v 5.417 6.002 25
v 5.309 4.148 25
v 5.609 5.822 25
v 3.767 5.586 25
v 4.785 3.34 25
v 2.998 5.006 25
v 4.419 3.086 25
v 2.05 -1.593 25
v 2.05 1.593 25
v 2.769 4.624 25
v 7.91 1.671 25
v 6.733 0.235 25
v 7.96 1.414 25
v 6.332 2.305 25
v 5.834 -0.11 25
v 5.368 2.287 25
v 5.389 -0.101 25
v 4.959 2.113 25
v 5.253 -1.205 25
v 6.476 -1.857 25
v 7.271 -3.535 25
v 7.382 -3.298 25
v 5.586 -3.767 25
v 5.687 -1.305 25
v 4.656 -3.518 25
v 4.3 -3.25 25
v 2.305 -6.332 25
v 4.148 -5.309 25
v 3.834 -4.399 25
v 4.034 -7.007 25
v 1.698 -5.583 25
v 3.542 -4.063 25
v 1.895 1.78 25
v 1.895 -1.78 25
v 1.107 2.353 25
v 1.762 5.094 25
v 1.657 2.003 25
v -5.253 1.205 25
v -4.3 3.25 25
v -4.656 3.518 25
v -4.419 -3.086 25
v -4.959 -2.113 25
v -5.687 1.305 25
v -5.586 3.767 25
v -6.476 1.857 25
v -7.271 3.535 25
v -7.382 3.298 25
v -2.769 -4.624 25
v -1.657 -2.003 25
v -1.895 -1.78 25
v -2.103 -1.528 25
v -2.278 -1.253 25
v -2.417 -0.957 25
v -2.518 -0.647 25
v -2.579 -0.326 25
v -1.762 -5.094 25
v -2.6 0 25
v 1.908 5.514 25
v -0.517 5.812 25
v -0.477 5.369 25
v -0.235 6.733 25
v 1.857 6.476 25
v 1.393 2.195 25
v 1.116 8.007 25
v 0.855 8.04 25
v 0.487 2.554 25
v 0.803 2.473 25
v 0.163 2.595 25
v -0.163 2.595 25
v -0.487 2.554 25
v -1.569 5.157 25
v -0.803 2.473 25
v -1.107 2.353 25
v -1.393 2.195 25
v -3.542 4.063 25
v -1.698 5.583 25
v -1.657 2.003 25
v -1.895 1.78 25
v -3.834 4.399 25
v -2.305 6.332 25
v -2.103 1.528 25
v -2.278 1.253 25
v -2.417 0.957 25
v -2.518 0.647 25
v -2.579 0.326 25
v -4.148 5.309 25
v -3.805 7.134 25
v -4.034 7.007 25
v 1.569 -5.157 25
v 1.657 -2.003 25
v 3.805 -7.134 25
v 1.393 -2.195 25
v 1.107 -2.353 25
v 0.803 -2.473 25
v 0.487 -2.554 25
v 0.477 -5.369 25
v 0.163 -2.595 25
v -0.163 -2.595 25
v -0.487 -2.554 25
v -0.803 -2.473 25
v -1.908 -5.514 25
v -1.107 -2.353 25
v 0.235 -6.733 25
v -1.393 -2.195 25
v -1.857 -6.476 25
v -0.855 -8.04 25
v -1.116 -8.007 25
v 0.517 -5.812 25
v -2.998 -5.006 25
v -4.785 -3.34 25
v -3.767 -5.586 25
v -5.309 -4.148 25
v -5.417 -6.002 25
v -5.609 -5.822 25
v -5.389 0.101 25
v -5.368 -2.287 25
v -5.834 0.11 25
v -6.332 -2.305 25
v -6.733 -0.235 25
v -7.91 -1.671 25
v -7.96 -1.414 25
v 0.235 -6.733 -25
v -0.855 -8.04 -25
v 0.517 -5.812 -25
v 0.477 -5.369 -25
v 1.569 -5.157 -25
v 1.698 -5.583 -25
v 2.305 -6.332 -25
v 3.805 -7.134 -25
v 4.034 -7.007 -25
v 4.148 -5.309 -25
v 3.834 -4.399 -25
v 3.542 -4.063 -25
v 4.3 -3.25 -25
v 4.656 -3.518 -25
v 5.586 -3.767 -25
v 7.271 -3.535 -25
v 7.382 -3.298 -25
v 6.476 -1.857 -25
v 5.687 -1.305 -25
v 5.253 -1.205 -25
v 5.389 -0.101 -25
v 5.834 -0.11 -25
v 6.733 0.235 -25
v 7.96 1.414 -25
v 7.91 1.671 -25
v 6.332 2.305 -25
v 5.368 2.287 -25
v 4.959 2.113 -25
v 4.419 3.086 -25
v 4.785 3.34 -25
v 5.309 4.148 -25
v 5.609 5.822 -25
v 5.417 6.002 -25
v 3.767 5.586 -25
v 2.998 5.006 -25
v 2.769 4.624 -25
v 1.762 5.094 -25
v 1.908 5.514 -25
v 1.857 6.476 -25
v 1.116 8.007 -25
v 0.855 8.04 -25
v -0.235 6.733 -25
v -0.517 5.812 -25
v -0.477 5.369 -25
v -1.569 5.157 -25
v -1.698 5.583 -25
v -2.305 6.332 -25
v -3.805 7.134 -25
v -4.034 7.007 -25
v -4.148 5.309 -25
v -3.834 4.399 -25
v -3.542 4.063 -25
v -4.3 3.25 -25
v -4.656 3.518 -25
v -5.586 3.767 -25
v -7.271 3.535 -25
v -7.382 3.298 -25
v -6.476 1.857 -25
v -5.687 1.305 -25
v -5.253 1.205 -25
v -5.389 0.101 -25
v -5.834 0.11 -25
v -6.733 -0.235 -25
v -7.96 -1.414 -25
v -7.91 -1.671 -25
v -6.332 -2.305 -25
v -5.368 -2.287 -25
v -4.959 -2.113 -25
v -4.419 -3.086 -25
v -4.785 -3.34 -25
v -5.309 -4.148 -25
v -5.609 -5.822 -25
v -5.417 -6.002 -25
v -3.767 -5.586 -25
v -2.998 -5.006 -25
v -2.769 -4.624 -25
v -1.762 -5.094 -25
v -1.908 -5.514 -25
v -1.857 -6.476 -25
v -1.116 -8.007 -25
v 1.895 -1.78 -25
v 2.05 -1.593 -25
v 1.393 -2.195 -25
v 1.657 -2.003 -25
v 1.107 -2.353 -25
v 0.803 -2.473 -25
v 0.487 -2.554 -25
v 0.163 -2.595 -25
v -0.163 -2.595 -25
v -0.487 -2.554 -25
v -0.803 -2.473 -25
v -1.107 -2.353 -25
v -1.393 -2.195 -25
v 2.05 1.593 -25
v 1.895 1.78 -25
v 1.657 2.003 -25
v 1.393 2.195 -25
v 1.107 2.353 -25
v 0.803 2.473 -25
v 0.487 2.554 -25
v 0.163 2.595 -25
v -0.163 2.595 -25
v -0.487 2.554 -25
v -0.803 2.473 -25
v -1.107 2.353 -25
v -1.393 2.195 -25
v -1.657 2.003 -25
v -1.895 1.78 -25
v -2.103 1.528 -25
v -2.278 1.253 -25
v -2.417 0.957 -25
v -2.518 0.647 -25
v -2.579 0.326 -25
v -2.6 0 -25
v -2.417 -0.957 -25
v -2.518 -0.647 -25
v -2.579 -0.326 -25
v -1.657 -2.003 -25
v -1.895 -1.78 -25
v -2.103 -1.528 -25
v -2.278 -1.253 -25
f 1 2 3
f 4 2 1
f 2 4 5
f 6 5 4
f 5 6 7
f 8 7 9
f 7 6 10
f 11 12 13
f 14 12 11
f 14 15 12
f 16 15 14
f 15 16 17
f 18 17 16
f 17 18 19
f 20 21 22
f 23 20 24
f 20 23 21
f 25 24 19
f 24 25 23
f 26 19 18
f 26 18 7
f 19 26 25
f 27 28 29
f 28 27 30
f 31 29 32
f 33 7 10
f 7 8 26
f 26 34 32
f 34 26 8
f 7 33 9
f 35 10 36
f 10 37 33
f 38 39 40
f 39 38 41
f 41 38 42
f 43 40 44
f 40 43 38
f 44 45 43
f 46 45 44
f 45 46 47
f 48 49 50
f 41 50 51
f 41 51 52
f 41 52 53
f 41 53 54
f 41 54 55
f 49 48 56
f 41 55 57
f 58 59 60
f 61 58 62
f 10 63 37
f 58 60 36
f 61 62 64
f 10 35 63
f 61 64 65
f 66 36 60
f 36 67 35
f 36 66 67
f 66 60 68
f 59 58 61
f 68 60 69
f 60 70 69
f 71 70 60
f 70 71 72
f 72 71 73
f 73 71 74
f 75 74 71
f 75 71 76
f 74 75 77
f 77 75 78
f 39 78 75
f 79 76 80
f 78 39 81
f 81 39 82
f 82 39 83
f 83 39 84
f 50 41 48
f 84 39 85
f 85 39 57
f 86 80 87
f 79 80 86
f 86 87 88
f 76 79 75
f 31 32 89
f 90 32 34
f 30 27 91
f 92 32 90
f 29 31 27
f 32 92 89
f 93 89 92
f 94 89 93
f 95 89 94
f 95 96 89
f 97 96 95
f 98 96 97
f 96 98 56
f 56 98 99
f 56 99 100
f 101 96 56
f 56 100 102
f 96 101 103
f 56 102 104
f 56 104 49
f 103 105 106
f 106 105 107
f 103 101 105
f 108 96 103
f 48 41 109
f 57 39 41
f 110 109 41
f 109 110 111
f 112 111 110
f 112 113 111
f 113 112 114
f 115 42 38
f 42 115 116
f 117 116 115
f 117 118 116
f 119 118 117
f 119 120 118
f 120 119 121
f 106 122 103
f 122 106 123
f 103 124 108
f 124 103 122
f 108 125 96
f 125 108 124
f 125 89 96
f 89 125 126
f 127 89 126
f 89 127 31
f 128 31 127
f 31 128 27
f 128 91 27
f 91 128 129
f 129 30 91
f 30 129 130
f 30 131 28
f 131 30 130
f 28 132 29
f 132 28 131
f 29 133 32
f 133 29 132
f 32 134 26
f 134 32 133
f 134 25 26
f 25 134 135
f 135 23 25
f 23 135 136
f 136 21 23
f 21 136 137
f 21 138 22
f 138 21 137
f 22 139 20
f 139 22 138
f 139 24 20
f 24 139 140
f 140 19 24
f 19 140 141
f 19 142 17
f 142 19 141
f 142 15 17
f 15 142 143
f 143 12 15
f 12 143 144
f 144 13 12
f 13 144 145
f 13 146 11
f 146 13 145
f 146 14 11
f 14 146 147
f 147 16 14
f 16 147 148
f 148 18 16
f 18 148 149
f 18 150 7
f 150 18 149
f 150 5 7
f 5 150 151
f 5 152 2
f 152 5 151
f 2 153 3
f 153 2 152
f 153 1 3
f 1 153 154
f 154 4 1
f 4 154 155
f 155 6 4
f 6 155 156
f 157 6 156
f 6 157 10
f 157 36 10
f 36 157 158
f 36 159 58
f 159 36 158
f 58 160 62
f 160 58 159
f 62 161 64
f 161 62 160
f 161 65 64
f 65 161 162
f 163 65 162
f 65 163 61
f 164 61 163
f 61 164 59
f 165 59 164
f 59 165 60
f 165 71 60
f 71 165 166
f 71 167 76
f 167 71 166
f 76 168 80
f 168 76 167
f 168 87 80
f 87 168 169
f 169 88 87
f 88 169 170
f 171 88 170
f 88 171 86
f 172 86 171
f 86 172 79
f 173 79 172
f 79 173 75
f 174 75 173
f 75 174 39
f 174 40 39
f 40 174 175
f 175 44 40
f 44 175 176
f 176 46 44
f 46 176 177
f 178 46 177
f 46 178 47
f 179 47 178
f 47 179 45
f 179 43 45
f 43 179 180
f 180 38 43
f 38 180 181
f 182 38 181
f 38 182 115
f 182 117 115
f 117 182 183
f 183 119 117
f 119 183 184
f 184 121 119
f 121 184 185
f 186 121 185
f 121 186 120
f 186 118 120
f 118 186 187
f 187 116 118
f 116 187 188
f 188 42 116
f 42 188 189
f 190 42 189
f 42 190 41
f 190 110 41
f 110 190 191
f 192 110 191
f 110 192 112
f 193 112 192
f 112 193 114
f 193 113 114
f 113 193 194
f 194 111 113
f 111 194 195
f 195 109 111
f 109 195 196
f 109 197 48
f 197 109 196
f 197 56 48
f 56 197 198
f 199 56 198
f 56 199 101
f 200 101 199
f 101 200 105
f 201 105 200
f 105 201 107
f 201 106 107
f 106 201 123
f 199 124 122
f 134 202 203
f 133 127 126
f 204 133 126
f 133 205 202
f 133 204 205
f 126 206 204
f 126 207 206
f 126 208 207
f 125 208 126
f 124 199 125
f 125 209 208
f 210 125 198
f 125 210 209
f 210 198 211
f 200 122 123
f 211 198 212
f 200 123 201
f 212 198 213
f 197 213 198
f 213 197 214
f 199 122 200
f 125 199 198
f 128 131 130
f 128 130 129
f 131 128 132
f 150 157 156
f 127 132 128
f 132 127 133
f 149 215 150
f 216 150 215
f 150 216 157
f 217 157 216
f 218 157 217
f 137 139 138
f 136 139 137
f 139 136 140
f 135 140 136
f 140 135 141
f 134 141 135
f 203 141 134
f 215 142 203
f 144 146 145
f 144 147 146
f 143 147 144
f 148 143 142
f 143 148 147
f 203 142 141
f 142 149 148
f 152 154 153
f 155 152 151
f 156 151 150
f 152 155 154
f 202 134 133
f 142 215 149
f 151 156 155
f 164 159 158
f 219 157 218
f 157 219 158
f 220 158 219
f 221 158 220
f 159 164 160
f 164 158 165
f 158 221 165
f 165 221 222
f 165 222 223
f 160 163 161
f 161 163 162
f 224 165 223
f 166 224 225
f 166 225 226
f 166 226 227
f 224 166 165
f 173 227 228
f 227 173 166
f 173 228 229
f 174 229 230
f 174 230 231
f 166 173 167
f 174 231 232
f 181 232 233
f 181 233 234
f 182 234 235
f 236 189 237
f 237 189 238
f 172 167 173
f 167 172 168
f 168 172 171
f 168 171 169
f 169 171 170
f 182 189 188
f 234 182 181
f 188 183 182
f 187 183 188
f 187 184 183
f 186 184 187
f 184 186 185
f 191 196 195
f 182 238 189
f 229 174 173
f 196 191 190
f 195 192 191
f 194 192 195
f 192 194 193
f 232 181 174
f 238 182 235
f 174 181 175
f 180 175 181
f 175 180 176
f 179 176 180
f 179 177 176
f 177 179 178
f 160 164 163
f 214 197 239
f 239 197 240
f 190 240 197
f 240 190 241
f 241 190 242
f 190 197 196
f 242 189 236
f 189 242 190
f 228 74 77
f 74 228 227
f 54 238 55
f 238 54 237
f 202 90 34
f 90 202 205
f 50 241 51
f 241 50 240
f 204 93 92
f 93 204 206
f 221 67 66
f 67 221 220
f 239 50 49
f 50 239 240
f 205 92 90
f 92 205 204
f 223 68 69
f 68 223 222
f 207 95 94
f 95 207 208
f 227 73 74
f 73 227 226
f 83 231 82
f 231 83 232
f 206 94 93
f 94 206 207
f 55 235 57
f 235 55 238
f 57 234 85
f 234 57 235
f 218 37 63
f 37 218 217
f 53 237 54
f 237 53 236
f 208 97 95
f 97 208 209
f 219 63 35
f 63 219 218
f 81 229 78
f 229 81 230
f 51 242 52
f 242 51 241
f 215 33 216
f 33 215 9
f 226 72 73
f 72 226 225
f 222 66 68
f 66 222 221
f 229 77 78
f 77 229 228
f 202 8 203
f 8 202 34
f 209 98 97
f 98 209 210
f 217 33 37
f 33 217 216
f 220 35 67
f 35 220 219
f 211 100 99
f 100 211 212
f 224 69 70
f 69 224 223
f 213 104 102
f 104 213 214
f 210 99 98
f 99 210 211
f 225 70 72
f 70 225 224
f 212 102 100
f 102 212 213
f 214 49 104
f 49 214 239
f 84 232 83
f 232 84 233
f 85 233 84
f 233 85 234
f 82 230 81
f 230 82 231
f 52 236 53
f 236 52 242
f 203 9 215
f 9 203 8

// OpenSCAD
//globals
$fn=50;
obj_round = 50;
obj_height = 50;
shaft = 5.2;

module master(){
	module rightGear(twist) {
		rotate([0, 0, -25]) {
			translate([0, 0, obj_height/4])
			linear_extrude(height = obj_height/2, center = true, twist = twist, convexity = 10)
			    import (file = "../../vectors/small_gear.dxf", layer = "Layer_1");
				circle(r = 1);
		}
	}

module gearObject() {

	module gear() {

		union() {
			rightGear(twist);
			mirror([0,0,1]) rightGear(twist);
		}

	}

	module hole() {	
		cylinder(d=shaft, h=obj_height*2.1, center=true);
	}
	module bone() {
		difference() {
			gear(twist=0);

			hole();
		}
	}
	union() {
		translate([5.6/2, 0, 0]) cube([1.5,5,obj_height], center=true);
		bone();
	}
}
gearObject();
}

intersection(){

master();
}
